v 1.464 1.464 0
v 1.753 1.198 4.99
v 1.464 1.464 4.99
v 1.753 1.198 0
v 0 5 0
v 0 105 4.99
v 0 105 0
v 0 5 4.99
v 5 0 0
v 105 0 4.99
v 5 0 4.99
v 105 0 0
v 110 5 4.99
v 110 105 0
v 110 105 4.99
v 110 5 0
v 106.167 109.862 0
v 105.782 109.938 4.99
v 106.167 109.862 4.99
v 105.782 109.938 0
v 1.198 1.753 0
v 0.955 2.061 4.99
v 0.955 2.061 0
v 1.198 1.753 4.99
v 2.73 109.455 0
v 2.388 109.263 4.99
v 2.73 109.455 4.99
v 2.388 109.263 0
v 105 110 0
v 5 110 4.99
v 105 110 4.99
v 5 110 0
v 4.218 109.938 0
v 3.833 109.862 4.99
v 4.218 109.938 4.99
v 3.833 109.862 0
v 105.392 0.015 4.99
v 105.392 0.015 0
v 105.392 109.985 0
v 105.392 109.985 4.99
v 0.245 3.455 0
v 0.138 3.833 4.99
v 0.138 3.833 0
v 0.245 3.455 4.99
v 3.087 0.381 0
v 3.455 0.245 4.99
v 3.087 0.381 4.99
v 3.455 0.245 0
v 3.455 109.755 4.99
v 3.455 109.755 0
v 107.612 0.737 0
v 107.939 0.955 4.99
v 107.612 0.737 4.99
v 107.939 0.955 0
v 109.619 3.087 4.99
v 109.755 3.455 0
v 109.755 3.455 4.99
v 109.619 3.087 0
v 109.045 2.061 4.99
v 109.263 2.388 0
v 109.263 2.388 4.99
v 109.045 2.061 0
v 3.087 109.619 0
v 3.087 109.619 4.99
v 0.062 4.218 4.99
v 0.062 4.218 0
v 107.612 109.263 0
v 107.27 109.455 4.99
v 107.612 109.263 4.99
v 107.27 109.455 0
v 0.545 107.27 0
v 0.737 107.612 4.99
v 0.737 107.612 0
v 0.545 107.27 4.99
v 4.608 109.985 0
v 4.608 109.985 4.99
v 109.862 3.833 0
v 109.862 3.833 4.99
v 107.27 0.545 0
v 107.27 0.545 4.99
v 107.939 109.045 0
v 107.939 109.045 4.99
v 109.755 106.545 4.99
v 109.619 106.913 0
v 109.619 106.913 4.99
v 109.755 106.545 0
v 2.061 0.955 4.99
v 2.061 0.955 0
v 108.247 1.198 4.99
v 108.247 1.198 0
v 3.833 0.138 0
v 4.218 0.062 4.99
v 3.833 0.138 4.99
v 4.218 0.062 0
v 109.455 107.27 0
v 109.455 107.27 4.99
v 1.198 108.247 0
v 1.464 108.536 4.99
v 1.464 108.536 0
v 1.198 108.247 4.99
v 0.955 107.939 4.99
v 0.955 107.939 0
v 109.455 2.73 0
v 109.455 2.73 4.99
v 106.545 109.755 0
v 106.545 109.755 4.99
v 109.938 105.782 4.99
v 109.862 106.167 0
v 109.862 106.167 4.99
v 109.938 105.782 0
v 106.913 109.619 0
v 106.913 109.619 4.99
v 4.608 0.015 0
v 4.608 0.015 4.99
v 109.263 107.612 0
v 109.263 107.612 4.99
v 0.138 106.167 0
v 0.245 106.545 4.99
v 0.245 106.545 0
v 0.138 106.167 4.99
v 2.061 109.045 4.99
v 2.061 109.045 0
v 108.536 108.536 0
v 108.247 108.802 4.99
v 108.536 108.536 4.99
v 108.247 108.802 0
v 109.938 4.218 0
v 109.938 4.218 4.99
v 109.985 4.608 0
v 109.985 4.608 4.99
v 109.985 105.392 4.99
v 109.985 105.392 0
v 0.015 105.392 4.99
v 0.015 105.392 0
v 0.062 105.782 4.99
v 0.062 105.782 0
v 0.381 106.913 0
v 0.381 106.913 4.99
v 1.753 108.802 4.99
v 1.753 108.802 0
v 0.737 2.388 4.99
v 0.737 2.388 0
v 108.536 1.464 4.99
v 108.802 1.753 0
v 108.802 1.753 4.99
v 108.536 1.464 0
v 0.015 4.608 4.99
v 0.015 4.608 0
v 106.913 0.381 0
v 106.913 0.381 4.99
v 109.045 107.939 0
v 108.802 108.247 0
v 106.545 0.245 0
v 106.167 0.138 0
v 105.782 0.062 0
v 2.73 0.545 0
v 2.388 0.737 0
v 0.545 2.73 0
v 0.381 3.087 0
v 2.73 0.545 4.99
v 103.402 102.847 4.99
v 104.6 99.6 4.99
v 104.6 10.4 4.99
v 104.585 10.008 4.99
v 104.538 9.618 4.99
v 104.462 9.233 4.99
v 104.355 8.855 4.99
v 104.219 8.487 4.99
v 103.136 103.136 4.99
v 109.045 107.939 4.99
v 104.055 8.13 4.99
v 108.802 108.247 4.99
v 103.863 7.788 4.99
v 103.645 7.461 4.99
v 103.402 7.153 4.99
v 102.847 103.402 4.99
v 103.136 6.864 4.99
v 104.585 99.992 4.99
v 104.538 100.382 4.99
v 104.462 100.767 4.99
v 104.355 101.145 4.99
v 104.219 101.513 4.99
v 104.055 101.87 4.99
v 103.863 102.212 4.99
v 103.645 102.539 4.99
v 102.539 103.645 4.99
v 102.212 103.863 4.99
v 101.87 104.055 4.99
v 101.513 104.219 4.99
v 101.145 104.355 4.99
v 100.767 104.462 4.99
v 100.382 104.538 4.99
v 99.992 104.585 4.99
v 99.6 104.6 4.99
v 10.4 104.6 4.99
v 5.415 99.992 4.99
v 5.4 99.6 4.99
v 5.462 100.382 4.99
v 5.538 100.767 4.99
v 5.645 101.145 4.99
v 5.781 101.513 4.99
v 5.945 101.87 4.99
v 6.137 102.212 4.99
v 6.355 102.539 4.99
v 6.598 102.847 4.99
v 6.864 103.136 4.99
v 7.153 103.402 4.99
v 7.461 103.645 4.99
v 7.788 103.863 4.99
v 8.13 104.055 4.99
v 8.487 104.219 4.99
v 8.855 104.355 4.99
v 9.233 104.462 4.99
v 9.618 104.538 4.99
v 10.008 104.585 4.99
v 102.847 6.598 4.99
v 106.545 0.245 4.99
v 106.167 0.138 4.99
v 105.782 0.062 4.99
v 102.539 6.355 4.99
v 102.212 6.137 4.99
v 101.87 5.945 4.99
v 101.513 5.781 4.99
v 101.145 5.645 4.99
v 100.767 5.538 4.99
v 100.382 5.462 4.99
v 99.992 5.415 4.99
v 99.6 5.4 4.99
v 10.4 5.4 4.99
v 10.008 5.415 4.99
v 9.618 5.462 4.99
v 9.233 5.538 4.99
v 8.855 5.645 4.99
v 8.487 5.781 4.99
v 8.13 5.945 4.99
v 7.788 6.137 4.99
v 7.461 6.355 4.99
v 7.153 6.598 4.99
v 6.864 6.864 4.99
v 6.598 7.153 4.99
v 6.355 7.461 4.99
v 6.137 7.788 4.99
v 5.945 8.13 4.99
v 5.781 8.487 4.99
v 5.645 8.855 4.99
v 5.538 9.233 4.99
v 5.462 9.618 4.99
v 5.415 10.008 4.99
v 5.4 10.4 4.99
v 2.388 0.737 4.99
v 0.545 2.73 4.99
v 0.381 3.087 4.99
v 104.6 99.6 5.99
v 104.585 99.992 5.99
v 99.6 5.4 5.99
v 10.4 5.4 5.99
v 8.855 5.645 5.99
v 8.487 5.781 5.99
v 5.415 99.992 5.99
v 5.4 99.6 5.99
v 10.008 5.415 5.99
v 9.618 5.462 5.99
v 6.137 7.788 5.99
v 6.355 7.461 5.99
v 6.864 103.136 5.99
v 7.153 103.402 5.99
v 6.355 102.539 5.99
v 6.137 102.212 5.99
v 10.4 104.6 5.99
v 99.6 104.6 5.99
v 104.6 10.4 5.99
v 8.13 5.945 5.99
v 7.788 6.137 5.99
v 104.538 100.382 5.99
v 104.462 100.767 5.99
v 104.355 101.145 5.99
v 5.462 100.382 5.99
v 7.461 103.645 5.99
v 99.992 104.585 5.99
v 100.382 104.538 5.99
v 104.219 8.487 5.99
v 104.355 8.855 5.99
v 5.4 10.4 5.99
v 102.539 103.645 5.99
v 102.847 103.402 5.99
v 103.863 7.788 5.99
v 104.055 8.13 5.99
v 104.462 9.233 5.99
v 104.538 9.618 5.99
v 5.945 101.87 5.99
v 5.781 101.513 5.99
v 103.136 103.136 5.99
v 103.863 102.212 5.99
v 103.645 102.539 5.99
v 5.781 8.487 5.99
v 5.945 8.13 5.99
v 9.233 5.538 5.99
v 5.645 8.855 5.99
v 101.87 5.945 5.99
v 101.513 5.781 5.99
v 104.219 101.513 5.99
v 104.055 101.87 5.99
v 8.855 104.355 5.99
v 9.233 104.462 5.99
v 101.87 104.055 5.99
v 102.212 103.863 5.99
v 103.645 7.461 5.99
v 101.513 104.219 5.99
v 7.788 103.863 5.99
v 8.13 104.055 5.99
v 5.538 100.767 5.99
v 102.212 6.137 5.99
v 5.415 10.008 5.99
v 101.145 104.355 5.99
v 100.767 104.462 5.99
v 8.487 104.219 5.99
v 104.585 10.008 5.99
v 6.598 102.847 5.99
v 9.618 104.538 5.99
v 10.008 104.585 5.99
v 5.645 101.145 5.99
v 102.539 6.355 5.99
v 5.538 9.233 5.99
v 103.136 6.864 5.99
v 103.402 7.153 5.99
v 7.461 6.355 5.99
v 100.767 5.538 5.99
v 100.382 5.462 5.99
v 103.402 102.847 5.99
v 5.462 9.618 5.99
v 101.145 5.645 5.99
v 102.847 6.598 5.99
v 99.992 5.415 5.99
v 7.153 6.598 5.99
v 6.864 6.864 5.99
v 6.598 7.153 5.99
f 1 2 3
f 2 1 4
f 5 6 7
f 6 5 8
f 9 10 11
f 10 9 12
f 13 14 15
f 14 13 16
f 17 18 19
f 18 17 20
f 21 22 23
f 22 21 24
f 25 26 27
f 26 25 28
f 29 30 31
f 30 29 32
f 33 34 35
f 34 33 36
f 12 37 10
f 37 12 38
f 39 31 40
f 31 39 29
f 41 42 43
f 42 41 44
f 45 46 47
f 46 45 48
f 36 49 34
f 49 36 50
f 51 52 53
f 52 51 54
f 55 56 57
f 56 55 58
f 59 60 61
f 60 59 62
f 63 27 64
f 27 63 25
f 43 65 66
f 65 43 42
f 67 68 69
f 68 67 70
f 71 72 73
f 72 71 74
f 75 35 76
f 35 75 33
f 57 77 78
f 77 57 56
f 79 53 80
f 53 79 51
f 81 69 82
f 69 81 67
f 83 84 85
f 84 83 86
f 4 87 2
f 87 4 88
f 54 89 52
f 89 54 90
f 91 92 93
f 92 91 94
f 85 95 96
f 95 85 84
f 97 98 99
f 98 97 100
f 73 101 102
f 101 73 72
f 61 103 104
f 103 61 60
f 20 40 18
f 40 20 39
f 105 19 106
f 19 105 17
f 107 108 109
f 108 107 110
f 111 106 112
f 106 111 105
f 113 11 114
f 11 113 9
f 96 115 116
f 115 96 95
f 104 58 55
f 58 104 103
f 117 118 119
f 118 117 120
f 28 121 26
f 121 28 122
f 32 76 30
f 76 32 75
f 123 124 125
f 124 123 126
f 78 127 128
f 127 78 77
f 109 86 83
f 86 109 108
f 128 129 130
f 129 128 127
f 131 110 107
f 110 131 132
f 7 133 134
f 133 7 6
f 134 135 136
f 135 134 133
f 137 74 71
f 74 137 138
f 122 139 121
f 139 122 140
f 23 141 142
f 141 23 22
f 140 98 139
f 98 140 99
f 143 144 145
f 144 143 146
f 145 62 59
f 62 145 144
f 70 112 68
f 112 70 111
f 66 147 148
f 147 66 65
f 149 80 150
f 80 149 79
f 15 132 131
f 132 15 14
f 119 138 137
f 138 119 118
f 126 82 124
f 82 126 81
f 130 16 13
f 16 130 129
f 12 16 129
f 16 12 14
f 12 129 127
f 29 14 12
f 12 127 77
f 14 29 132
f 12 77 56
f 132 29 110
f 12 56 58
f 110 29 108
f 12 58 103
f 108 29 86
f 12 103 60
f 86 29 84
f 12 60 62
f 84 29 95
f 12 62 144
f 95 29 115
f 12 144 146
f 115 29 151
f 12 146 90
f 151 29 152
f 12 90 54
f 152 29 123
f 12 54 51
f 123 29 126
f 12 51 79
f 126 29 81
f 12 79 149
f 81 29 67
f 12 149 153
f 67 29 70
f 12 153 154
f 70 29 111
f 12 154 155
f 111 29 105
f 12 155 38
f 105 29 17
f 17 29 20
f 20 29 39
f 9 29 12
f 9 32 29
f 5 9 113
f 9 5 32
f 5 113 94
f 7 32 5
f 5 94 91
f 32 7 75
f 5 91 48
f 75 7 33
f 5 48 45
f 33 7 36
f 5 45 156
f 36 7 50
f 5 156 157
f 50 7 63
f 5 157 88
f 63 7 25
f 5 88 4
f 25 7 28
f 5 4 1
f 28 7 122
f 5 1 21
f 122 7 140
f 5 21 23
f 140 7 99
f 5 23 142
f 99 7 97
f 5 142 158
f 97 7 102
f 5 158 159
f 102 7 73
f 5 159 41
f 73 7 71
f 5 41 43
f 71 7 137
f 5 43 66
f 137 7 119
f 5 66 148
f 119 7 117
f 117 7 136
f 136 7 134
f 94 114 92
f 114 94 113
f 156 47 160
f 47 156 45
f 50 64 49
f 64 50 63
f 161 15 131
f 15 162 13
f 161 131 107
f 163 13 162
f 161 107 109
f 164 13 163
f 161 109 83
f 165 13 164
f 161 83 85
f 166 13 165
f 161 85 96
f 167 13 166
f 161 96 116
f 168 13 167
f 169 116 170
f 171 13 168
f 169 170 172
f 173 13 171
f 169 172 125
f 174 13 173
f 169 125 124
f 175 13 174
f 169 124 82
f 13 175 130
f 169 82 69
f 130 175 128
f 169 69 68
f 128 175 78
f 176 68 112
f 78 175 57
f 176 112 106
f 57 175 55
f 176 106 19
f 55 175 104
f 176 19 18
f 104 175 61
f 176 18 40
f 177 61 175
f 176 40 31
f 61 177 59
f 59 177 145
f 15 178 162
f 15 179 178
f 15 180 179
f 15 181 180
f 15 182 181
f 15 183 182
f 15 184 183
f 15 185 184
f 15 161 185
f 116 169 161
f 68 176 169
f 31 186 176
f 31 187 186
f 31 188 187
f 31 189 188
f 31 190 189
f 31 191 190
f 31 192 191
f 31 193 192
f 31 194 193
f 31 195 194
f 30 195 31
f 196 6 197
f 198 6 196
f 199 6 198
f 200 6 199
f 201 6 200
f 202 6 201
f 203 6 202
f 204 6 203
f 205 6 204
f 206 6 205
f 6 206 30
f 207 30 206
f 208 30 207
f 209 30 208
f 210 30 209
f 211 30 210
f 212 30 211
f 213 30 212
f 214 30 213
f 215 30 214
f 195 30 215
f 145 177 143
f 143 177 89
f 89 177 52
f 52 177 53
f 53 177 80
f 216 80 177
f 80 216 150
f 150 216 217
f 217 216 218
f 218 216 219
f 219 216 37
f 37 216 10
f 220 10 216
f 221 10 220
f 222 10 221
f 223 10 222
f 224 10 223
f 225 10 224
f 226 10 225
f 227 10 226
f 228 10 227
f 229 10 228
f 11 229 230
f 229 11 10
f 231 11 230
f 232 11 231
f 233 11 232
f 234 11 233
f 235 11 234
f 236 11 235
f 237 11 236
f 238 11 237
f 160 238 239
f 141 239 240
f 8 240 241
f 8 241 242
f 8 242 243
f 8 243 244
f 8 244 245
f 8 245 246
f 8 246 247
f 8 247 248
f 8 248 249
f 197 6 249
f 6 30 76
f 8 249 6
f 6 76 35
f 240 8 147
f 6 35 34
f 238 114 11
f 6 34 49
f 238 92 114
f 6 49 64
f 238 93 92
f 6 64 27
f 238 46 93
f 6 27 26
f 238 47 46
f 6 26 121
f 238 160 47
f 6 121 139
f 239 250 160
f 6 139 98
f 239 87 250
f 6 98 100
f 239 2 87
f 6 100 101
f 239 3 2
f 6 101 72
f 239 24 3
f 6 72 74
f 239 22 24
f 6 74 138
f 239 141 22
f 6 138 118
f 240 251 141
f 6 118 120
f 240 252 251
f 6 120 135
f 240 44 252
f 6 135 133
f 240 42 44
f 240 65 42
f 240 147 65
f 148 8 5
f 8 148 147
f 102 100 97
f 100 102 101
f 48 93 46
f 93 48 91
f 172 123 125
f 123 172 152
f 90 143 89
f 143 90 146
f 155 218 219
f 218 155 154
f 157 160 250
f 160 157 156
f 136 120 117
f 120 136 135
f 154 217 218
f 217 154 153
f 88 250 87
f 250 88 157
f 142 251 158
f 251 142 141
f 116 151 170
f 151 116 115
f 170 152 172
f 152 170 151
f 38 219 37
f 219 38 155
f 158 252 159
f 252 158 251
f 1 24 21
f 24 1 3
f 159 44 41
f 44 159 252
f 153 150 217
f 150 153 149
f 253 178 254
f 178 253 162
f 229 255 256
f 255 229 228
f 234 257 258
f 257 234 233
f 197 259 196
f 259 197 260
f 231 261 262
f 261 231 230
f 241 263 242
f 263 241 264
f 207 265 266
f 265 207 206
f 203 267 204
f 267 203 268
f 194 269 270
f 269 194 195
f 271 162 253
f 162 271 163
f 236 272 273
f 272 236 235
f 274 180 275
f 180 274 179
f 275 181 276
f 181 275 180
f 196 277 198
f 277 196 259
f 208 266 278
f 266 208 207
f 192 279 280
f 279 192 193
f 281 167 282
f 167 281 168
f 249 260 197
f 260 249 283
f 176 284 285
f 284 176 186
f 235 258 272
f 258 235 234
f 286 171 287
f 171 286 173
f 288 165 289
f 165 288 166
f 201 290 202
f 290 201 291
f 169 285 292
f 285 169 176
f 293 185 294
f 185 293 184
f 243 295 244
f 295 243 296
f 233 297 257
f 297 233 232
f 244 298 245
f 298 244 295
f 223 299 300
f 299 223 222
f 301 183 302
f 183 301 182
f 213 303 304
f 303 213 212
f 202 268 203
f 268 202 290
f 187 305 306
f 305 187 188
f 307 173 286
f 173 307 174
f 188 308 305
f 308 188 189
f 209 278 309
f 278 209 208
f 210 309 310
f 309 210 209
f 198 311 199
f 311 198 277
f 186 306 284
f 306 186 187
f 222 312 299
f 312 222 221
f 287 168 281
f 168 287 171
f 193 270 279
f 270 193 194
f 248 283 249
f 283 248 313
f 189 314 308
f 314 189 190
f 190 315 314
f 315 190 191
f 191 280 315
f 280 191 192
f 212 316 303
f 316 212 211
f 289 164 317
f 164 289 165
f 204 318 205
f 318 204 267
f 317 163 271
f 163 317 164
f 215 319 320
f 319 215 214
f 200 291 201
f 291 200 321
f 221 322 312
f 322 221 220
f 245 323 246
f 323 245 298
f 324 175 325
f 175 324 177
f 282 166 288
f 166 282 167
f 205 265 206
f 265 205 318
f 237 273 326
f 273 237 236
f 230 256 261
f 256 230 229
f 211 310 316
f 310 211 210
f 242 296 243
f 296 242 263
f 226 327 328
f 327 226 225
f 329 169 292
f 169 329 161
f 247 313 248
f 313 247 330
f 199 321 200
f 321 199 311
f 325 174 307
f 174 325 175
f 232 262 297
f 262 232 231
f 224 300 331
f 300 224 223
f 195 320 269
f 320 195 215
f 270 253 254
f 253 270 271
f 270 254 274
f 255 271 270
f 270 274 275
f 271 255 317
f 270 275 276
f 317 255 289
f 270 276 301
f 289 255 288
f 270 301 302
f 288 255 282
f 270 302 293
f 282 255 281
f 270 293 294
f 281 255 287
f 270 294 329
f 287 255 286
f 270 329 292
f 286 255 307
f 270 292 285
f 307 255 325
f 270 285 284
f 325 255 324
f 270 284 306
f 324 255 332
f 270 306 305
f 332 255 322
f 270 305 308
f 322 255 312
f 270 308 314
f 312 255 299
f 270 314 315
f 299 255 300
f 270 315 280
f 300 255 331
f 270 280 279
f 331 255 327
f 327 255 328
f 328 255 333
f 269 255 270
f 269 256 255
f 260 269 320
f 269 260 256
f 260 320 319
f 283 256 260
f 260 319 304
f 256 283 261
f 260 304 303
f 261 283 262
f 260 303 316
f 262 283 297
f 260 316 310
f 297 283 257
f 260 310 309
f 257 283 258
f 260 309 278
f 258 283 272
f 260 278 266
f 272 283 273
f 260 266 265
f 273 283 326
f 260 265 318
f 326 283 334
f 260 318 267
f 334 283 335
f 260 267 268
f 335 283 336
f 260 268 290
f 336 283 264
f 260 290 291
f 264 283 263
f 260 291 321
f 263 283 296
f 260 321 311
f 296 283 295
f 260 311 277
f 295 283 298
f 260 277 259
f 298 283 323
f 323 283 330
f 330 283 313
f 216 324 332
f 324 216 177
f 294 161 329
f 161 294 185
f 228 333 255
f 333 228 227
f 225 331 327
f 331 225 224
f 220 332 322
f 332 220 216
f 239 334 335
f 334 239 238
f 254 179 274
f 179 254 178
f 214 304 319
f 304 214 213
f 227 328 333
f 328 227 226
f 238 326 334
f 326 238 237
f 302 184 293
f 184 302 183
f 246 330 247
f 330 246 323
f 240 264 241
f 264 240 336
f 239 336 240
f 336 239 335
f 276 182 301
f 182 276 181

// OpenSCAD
/*
makerspace workshop 2023-09-02
author: andimoto
*/
$fn=80;

/* [box dimensions] */
innerBoxX = 100;
innerBoxY = 100;
innerBoxZ = 60;

wallThickness = 5;
bottomThickness = 5;

edgeRadius = 5;

/* [lid] */
lidThickness = 5;
lidClearance = 0.4;
lidFixZ = 1;

/* [other parameters] */
extra = 0.01;

module box()
{
  difference()
  {
    translate([edgeRadius,edgeRadius,0])
    minkowski()
    {
      cube([innerBoxX+wallThickness*2-edgeRadius*2,
        innerBoxY+wallThickness*2-edgeRadius*2,
        innerBoxZ+bottomThickness-extra*2]);
      cylinder(r=edgeRadius, h=extra);
    }

    translate([edgeRadius+wallThickness,edgeRadius+wallThickness,bottomThickness+extra])
    minkowski()
    {
      cube([innerBoxX-edgeRadius*2,
        innerBoxY-edgeRadius*2,
        innerBoxZ-extra*2]);
      cylinder(r=edgeRadius, h=extra);
    }
  }
}

/* box(); */


module lid()
{
  difference()
  {
    union()
    {
      translate([edgeRadius,edgeRadius,0])
      minkowski()
      {
        cube([innerBoxX+wallThickness*2-edgeRadius*2,
          innerBoxY+wallThickness*2-edgeRadius*2,
          lidThickness-extra*2]);
        cylinder(r=edgeRadius, h=extra);
      }
      translate([edgeRadius+wallThickness+lidClearance,
        edgeRadius+wallThickness+lidClearance,0])
      minkowski()
      {
        cube([innerBoxX-lidClearance*2-edgeRadius*2,
          innerBoxY-lidClearance*2-edgeRadius*2,
          lidFixZ+lidThickness-extra*2]);
        cylinder(r=edgeRadius, h=extra);
      }
    } /* union */

    screws();

  }
}
lid();

module screws()
{

}
